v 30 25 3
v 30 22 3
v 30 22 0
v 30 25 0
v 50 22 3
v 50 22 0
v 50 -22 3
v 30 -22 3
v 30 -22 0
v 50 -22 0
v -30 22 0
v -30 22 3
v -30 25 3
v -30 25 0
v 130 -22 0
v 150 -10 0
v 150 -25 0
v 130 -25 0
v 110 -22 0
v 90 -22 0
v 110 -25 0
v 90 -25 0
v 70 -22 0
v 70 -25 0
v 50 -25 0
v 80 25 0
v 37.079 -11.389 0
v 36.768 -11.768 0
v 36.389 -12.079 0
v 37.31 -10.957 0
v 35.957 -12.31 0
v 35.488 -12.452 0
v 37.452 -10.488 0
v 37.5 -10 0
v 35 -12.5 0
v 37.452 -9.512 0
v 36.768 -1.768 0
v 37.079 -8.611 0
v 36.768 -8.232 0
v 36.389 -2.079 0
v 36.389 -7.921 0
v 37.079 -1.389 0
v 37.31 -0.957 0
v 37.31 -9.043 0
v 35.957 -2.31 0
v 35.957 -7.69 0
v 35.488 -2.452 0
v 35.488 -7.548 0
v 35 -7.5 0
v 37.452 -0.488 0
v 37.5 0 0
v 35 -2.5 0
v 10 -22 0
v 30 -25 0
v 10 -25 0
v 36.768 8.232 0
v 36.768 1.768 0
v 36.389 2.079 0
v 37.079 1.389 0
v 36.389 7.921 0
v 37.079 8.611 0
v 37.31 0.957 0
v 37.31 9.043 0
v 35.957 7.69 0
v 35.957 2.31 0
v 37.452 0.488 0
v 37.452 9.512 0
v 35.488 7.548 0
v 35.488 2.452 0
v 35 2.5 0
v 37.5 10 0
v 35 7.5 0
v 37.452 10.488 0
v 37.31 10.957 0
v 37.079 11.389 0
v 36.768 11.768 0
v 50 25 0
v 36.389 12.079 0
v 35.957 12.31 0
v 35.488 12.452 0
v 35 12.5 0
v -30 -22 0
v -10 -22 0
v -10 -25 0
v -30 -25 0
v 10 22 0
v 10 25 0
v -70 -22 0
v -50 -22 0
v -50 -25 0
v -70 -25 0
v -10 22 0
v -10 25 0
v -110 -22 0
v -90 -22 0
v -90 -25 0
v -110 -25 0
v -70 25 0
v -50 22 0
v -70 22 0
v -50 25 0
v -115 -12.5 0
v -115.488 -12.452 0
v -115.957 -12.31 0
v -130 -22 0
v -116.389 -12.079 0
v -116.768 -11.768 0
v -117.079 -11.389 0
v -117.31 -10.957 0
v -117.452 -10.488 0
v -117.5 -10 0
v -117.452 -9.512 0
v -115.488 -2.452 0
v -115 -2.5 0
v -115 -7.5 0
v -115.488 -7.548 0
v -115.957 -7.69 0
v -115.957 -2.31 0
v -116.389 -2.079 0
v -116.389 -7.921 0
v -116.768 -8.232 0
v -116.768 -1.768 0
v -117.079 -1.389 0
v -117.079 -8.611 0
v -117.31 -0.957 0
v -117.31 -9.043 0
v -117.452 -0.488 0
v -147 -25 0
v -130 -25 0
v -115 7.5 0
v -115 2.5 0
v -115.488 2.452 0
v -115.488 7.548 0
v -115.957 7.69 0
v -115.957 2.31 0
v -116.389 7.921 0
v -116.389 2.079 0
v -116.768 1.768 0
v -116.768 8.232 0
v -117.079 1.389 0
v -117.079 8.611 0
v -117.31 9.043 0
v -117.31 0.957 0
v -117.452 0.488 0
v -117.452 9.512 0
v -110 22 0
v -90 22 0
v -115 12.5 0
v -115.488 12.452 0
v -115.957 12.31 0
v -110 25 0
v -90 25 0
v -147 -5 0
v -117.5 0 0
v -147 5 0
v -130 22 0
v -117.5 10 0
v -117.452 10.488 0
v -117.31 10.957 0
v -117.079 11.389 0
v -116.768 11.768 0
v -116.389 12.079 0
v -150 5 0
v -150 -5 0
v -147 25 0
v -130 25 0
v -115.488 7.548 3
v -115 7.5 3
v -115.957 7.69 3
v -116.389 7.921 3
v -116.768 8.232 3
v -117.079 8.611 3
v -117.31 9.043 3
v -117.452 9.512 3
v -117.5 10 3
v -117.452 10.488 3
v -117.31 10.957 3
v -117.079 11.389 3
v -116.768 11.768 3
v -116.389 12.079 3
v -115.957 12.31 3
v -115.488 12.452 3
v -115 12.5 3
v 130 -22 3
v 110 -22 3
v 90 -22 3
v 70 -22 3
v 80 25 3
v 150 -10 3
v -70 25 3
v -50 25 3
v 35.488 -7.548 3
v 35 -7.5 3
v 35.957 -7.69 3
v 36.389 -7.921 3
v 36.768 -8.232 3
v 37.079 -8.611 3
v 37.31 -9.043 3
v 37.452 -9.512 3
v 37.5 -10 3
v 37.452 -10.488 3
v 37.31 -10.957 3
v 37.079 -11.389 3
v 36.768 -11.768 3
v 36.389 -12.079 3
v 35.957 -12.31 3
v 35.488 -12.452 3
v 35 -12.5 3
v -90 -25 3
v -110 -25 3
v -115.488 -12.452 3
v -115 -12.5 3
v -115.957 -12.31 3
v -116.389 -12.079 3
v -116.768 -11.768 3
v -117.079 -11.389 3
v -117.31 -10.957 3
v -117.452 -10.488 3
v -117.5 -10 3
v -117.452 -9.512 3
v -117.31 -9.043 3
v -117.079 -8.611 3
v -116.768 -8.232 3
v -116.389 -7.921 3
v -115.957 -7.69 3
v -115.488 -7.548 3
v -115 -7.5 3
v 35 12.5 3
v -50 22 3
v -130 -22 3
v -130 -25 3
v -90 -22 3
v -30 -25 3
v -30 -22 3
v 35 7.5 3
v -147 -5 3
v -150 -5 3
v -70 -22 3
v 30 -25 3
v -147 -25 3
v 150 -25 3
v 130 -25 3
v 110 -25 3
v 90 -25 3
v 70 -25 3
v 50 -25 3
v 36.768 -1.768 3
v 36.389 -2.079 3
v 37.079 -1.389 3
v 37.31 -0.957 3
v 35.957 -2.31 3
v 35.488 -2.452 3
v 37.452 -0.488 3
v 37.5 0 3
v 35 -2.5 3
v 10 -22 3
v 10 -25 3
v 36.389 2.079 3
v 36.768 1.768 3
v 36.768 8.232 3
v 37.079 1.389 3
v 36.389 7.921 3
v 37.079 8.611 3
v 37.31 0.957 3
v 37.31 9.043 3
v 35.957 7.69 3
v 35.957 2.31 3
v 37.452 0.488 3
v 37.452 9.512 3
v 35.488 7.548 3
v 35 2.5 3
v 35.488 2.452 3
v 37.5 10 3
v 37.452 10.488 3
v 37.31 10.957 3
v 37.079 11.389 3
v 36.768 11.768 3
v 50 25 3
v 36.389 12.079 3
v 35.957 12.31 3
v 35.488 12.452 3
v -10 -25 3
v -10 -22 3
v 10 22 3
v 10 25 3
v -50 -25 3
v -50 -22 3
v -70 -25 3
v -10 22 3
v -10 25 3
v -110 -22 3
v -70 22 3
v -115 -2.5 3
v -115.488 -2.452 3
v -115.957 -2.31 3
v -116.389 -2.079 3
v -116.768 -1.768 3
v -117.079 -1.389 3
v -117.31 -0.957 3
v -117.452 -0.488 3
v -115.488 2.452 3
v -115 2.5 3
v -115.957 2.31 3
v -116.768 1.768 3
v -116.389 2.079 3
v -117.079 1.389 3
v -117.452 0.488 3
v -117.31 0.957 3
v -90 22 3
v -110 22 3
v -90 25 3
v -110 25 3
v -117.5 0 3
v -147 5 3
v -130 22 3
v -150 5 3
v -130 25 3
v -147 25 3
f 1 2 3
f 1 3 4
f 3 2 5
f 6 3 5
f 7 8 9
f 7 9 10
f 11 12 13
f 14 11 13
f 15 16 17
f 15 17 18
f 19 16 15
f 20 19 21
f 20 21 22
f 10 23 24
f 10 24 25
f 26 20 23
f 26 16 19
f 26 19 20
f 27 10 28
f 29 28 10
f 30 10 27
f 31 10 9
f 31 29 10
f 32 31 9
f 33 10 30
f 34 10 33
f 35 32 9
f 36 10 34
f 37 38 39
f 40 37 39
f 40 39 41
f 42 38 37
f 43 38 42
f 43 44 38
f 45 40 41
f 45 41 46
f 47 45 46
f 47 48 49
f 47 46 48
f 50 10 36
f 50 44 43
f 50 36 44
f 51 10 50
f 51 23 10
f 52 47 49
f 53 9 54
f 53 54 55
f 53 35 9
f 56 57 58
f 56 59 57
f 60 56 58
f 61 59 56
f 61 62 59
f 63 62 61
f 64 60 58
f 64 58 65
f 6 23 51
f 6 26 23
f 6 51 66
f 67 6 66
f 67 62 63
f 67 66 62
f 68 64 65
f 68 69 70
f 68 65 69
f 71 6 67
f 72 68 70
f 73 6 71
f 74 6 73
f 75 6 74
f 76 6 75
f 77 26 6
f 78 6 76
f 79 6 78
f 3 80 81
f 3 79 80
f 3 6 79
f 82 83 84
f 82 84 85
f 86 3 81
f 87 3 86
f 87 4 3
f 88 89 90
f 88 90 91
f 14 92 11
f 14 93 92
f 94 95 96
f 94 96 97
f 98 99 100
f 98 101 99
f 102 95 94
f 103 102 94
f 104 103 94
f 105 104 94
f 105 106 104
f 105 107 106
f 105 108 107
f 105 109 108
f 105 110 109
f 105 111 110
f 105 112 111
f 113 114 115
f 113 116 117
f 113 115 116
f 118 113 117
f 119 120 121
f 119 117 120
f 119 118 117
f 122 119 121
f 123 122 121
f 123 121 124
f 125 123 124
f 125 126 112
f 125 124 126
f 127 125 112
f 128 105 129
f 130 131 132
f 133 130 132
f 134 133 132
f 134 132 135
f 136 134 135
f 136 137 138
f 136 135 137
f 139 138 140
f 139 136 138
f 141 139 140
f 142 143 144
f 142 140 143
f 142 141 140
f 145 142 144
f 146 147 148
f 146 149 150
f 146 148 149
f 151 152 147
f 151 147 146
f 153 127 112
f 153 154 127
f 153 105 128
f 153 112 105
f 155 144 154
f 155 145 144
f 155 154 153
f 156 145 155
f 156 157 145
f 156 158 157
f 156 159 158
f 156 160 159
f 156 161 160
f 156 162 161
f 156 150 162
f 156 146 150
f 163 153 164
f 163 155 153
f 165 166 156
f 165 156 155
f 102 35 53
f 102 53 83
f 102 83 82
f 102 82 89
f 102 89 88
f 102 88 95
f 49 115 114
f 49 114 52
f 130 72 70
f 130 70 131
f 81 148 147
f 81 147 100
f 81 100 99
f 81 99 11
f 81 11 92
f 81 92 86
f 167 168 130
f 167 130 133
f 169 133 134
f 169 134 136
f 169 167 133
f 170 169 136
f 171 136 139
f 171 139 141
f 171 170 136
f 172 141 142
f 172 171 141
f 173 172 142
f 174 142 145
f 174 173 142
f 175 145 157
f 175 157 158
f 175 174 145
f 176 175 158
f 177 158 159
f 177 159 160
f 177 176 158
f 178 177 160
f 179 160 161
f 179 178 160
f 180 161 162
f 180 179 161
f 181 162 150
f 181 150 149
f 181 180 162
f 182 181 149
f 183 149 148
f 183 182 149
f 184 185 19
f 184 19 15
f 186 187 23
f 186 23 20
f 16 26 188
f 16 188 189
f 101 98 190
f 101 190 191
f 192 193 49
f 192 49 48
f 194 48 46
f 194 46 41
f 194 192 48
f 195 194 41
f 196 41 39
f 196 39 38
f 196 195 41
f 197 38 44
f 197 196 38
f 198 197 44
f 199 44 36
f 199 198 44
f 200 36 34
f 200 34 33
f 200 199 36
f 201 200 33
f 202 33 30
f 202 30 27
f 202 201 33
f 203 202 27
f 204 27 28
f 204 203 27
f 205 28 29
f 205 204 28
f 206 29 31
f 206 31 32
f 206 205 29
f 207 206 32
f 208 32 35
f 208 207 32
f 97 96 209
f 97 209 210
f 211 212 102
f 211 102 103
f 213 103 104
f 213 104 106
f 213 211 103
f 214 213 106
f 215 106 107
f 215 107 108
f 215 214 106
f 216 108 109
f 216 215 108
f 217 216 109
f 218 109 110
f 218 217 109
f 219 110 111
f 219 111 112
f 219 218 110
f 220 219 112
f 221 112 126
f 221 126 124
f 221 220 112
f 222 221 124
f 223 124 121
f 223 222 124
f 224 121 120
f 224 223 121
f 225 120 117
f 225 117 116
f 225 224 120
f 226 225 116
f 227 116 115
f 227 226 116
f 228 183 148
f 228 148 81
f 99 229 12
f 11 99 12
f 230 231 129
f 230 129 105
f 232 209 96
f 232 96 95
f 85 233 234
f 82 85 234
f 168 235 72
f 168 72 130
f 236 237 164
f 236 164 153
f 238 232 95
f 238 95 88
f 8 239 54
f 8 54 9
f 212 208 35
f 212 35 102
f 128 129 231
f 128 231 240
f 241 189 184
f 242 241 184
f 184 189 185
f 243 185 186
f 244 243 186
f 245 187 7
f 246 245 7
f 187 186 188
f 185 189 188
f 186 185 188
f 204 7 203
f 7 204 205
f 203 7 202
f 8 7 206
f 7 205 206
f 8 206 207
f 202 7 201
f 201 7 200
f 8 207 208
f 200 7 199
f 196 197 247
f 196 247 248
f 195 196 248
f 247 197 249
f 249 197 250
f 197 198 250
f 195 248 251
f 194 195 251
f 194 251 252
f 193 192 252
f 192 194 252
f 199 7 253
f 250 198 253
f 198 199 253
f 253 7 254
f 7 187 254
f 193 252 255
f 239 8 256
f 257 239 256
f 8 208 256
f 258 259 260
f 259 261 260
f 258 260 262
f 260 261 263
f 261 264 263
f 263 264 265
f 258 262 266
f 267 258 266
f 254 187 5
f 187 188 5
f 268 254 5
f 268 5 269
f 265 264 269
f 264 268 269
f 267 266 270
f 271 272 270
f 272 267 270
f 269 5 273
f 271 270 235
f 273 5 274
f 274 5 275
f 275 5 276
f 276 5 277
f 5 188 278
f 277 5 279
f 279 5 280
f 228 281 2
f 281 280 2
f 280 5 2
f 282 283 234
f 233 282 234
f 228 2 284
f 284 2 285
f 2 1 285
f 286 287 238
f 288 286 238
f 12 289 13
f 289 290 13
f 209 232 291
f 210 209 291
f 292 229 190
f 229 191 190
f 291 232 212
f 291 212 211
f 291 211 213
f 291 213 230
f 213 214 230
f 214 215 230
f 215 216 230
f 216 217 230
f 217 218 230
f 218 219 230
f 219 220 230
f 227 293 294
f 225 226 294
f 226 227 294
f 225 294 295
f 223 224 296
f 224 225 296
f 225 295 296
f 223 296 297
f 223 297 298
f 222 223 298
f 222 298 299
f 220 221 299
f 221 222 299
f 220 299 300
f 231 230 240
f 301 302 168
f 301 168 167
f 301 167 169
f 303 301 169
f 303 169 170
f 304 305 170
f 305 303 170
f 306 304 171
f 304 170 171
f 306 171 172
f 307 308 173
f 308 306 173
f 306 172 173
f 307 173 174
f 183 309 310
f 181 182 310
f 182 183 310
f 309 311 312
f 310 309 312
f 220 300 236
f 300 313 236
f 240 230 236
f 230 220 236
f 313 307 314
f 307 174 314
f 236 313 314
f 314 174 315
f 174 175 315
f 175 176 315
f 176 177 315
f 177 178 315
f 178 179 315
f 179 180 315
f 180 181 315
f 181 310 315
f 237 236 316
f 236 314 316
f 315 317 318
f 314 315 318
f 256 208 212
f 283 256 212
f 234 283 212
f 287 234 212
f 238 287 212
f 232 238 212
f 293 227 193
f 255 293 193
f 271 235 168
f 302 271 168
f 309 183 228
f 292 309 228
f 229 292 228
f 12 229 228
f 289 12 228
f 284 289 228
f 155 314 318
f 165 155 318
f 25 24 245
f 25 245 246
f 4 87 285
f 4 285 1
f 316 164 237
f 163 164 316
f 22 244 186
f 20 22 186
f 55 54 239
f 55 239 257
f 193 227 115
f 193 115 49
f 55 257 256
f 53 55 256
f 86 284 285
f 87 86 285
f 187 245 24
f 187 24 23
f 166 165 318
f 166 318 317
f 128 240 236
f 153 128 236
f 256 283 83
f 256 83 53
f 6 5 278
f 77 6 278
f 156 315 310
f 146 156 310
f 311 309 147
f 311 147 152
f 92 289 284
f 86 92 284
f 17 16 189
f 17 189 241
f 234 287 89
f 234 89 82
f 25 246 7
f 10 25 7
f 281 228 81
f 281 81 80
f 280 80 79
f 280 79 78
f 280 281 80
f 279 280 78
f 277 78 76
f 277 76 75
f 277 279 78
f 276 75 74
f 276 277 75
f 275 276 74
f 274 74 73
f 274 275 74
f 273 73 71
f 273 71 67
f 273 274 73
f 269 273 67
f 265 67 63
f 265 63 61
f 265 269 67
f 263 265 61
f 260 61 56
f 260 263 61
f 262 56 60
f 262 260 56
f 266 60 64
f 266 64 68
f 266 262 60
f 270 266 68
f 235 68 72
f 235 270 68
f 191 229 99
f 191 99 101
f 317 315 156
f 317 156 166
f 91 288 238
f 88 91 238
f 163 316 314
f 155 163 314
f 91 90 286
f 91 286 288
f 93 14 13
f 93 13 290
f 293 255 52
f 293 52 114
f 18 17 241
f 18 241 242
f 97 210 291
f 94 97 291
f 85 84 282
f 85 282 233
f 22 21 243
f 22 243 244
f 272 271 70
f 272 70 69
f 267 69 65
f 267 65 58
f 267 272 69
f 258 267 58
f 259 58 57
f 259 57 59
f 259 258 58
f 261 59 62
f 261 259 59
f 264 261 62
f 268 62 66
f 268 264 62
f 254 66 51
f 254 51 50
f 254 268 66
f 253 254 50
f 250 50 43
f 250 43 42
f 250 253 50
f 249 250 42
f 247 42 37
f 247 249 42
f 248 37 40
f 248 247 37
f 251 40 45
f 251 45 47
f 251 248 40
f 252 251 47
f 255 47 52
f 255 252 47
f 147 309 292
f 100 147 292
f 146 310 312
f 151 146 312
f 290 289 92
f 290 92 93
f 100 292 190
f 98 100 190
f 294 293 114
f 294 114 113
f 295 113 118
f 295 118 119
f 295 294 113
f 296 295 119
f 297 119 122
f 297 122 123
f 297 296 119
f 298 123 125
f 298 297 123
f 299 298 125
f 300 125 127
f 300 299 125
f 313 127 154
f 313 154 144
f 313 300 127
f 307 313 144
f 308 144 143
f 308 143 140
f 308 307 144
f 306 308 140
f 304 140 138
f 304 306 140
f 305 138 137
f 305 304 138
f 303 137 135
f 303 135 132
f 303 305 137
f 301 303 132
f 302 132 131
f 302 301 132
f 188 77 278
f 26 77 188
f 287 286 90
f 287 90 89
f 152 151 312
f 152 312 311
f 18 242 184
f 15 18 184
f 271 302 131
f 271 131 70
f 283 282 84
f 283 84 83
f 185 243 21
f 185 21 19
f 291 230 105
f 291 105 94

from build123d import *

# Parameters (mm, degrees)
BOSS_EXTRUDE1_DEPTH = 3
SKETCH2_W           = 20
SKETCH2_H           = 3
SKETCH2_W_2         = 3
SKETCH2_H_2         = 10
CUT_EXTRUDE1_DEPTH  = 3
SKETCH3_W           = 3
SKETCH3_H           = 10
CUT_EXTRUDE2_DEPTH  = 3
CUT_EXTRUDE3_DEPTH  = 3


with BuildPart() as part:
    # Sketch1 → Boss-Extrude1 (new body)
    with BuildSketch(Plane.XY):
        Polygon((80, 25), (150, -10), (150, -25), (-150, -25), (-150, 25), align=None)
    extrude(amount=BOSS_EXTRUDE1_DEPTH)

    # Sketch2 → Cut-Extrude1 (cut)
    with BuildSketch(Plane.XY.offset(3)):
        with Locations((-120, 23.5)):
            Rectangle(SKETCH2_W, SKETCH2_H)
        with Locations((-80, 23.5)):
            Rectangle(SKETCH2_W, SKETCH2_H)
        with Locations((-40, 23.5)):
            Rectangle(SKETCH2_W, SKETCH2_H)
        with Locations((-148.5, 10)):
            Rectangle(SKETCH2_W_2, SKETCH2_H_2)
        with Locations((-120, -23.5)):
            Rectangle(SKETCH2_W, SKETCH2_H)
        with Locations((0, 23.5)):
            Rectangle(SKETCH2_W, SKETCH2_H)
        with Locations((40, 23.5)):
            Rectangle(SKETCH2_W, SKETCH2_H)
        with Locations((-80, -23.5)):
            Rectangle(SKETCH2_W, SKETCH2_H)
        with Locations((-40, -23.5)):
            Rectangle(SKETCH2_W, SKETCH2_H)
        with Locations((0, -23.5)):
            Rectangle(SKETCH2_W, SKETCH2_H)
        with Locations((40, -23.5)):
            Rectangle(SKETCH2_W, SKETCH2_H)
        with Locations((80, -23.5)):
            Rectangle(SKETCH2_W, SKETCH2_H)
        with Locations((120, -23.5)):
            Rectangle(SKETCH2_W, SKETCH2_H)
        with Locations((-148.5, -10)):
            Rectangle(SKETCH2_W_2, SKETCH2_H_2)
    extrude(amount=-CUT_EXTRUDE1_DEPTH, mode=Mode.SUBTRACT)

    # Sketch3 → Cut-Extrude2 (cut)
    with BuildSketch(Plane.XY.offset(3)):
        with Locations((-148.5, 20)):
            Rectangle(SKETCH3_W, SKETCH3_H)
        with Locations((-148.5, -20)):
            Rectangle(SKETCH3_W, SKETCH3_H)
    extrude(amount=-CUT_EXTRUDE2_DEPTH, mode=Mode.SUBTRACT)

    # Sketch4 → Cut-Extrude3 (cut)
    with BuildSketch(Plane.XY.offset(3)):
        with BuildLine():
            Line((35, 7.5), (-115, 7.5))
            ThreePointArc((-115, 7.5), (-117.5, 10), (-115, 12.5))
            Line((-115, 12.5), (35, 12.5))
            ThreePointArc((35, 12.5), (37.5, 10), (35, 7.5))
        make_face()
        with BuildLine():
            Line((35, -2.5), (-115, -2.5))
            ThreePointArc((-115, -2.5), (-117.5, 0), (-115, 2.5))
            Line((-115, 2.5), (35, 2.5))
            ThreePointArc((35, 2.5), (37.5, 0), (35, -2.5))
        make_face()
        with BuildLine():
            Line((35, -12.5), (-115, -12.5))
            ThreePointArc((-115, -12.5), (-117.5, -10), (-115, -7.5))
            Line((-115, -7.5), (35, -7.5))
            ThreePointArc((35, -7.5), (37.5, -10), (35, -12.5))
        make_face()
    extrude(amount=-CUT_EXTRUDE3_DEPTH, mode=Mode.SUBTRACT)


solid = part.part
